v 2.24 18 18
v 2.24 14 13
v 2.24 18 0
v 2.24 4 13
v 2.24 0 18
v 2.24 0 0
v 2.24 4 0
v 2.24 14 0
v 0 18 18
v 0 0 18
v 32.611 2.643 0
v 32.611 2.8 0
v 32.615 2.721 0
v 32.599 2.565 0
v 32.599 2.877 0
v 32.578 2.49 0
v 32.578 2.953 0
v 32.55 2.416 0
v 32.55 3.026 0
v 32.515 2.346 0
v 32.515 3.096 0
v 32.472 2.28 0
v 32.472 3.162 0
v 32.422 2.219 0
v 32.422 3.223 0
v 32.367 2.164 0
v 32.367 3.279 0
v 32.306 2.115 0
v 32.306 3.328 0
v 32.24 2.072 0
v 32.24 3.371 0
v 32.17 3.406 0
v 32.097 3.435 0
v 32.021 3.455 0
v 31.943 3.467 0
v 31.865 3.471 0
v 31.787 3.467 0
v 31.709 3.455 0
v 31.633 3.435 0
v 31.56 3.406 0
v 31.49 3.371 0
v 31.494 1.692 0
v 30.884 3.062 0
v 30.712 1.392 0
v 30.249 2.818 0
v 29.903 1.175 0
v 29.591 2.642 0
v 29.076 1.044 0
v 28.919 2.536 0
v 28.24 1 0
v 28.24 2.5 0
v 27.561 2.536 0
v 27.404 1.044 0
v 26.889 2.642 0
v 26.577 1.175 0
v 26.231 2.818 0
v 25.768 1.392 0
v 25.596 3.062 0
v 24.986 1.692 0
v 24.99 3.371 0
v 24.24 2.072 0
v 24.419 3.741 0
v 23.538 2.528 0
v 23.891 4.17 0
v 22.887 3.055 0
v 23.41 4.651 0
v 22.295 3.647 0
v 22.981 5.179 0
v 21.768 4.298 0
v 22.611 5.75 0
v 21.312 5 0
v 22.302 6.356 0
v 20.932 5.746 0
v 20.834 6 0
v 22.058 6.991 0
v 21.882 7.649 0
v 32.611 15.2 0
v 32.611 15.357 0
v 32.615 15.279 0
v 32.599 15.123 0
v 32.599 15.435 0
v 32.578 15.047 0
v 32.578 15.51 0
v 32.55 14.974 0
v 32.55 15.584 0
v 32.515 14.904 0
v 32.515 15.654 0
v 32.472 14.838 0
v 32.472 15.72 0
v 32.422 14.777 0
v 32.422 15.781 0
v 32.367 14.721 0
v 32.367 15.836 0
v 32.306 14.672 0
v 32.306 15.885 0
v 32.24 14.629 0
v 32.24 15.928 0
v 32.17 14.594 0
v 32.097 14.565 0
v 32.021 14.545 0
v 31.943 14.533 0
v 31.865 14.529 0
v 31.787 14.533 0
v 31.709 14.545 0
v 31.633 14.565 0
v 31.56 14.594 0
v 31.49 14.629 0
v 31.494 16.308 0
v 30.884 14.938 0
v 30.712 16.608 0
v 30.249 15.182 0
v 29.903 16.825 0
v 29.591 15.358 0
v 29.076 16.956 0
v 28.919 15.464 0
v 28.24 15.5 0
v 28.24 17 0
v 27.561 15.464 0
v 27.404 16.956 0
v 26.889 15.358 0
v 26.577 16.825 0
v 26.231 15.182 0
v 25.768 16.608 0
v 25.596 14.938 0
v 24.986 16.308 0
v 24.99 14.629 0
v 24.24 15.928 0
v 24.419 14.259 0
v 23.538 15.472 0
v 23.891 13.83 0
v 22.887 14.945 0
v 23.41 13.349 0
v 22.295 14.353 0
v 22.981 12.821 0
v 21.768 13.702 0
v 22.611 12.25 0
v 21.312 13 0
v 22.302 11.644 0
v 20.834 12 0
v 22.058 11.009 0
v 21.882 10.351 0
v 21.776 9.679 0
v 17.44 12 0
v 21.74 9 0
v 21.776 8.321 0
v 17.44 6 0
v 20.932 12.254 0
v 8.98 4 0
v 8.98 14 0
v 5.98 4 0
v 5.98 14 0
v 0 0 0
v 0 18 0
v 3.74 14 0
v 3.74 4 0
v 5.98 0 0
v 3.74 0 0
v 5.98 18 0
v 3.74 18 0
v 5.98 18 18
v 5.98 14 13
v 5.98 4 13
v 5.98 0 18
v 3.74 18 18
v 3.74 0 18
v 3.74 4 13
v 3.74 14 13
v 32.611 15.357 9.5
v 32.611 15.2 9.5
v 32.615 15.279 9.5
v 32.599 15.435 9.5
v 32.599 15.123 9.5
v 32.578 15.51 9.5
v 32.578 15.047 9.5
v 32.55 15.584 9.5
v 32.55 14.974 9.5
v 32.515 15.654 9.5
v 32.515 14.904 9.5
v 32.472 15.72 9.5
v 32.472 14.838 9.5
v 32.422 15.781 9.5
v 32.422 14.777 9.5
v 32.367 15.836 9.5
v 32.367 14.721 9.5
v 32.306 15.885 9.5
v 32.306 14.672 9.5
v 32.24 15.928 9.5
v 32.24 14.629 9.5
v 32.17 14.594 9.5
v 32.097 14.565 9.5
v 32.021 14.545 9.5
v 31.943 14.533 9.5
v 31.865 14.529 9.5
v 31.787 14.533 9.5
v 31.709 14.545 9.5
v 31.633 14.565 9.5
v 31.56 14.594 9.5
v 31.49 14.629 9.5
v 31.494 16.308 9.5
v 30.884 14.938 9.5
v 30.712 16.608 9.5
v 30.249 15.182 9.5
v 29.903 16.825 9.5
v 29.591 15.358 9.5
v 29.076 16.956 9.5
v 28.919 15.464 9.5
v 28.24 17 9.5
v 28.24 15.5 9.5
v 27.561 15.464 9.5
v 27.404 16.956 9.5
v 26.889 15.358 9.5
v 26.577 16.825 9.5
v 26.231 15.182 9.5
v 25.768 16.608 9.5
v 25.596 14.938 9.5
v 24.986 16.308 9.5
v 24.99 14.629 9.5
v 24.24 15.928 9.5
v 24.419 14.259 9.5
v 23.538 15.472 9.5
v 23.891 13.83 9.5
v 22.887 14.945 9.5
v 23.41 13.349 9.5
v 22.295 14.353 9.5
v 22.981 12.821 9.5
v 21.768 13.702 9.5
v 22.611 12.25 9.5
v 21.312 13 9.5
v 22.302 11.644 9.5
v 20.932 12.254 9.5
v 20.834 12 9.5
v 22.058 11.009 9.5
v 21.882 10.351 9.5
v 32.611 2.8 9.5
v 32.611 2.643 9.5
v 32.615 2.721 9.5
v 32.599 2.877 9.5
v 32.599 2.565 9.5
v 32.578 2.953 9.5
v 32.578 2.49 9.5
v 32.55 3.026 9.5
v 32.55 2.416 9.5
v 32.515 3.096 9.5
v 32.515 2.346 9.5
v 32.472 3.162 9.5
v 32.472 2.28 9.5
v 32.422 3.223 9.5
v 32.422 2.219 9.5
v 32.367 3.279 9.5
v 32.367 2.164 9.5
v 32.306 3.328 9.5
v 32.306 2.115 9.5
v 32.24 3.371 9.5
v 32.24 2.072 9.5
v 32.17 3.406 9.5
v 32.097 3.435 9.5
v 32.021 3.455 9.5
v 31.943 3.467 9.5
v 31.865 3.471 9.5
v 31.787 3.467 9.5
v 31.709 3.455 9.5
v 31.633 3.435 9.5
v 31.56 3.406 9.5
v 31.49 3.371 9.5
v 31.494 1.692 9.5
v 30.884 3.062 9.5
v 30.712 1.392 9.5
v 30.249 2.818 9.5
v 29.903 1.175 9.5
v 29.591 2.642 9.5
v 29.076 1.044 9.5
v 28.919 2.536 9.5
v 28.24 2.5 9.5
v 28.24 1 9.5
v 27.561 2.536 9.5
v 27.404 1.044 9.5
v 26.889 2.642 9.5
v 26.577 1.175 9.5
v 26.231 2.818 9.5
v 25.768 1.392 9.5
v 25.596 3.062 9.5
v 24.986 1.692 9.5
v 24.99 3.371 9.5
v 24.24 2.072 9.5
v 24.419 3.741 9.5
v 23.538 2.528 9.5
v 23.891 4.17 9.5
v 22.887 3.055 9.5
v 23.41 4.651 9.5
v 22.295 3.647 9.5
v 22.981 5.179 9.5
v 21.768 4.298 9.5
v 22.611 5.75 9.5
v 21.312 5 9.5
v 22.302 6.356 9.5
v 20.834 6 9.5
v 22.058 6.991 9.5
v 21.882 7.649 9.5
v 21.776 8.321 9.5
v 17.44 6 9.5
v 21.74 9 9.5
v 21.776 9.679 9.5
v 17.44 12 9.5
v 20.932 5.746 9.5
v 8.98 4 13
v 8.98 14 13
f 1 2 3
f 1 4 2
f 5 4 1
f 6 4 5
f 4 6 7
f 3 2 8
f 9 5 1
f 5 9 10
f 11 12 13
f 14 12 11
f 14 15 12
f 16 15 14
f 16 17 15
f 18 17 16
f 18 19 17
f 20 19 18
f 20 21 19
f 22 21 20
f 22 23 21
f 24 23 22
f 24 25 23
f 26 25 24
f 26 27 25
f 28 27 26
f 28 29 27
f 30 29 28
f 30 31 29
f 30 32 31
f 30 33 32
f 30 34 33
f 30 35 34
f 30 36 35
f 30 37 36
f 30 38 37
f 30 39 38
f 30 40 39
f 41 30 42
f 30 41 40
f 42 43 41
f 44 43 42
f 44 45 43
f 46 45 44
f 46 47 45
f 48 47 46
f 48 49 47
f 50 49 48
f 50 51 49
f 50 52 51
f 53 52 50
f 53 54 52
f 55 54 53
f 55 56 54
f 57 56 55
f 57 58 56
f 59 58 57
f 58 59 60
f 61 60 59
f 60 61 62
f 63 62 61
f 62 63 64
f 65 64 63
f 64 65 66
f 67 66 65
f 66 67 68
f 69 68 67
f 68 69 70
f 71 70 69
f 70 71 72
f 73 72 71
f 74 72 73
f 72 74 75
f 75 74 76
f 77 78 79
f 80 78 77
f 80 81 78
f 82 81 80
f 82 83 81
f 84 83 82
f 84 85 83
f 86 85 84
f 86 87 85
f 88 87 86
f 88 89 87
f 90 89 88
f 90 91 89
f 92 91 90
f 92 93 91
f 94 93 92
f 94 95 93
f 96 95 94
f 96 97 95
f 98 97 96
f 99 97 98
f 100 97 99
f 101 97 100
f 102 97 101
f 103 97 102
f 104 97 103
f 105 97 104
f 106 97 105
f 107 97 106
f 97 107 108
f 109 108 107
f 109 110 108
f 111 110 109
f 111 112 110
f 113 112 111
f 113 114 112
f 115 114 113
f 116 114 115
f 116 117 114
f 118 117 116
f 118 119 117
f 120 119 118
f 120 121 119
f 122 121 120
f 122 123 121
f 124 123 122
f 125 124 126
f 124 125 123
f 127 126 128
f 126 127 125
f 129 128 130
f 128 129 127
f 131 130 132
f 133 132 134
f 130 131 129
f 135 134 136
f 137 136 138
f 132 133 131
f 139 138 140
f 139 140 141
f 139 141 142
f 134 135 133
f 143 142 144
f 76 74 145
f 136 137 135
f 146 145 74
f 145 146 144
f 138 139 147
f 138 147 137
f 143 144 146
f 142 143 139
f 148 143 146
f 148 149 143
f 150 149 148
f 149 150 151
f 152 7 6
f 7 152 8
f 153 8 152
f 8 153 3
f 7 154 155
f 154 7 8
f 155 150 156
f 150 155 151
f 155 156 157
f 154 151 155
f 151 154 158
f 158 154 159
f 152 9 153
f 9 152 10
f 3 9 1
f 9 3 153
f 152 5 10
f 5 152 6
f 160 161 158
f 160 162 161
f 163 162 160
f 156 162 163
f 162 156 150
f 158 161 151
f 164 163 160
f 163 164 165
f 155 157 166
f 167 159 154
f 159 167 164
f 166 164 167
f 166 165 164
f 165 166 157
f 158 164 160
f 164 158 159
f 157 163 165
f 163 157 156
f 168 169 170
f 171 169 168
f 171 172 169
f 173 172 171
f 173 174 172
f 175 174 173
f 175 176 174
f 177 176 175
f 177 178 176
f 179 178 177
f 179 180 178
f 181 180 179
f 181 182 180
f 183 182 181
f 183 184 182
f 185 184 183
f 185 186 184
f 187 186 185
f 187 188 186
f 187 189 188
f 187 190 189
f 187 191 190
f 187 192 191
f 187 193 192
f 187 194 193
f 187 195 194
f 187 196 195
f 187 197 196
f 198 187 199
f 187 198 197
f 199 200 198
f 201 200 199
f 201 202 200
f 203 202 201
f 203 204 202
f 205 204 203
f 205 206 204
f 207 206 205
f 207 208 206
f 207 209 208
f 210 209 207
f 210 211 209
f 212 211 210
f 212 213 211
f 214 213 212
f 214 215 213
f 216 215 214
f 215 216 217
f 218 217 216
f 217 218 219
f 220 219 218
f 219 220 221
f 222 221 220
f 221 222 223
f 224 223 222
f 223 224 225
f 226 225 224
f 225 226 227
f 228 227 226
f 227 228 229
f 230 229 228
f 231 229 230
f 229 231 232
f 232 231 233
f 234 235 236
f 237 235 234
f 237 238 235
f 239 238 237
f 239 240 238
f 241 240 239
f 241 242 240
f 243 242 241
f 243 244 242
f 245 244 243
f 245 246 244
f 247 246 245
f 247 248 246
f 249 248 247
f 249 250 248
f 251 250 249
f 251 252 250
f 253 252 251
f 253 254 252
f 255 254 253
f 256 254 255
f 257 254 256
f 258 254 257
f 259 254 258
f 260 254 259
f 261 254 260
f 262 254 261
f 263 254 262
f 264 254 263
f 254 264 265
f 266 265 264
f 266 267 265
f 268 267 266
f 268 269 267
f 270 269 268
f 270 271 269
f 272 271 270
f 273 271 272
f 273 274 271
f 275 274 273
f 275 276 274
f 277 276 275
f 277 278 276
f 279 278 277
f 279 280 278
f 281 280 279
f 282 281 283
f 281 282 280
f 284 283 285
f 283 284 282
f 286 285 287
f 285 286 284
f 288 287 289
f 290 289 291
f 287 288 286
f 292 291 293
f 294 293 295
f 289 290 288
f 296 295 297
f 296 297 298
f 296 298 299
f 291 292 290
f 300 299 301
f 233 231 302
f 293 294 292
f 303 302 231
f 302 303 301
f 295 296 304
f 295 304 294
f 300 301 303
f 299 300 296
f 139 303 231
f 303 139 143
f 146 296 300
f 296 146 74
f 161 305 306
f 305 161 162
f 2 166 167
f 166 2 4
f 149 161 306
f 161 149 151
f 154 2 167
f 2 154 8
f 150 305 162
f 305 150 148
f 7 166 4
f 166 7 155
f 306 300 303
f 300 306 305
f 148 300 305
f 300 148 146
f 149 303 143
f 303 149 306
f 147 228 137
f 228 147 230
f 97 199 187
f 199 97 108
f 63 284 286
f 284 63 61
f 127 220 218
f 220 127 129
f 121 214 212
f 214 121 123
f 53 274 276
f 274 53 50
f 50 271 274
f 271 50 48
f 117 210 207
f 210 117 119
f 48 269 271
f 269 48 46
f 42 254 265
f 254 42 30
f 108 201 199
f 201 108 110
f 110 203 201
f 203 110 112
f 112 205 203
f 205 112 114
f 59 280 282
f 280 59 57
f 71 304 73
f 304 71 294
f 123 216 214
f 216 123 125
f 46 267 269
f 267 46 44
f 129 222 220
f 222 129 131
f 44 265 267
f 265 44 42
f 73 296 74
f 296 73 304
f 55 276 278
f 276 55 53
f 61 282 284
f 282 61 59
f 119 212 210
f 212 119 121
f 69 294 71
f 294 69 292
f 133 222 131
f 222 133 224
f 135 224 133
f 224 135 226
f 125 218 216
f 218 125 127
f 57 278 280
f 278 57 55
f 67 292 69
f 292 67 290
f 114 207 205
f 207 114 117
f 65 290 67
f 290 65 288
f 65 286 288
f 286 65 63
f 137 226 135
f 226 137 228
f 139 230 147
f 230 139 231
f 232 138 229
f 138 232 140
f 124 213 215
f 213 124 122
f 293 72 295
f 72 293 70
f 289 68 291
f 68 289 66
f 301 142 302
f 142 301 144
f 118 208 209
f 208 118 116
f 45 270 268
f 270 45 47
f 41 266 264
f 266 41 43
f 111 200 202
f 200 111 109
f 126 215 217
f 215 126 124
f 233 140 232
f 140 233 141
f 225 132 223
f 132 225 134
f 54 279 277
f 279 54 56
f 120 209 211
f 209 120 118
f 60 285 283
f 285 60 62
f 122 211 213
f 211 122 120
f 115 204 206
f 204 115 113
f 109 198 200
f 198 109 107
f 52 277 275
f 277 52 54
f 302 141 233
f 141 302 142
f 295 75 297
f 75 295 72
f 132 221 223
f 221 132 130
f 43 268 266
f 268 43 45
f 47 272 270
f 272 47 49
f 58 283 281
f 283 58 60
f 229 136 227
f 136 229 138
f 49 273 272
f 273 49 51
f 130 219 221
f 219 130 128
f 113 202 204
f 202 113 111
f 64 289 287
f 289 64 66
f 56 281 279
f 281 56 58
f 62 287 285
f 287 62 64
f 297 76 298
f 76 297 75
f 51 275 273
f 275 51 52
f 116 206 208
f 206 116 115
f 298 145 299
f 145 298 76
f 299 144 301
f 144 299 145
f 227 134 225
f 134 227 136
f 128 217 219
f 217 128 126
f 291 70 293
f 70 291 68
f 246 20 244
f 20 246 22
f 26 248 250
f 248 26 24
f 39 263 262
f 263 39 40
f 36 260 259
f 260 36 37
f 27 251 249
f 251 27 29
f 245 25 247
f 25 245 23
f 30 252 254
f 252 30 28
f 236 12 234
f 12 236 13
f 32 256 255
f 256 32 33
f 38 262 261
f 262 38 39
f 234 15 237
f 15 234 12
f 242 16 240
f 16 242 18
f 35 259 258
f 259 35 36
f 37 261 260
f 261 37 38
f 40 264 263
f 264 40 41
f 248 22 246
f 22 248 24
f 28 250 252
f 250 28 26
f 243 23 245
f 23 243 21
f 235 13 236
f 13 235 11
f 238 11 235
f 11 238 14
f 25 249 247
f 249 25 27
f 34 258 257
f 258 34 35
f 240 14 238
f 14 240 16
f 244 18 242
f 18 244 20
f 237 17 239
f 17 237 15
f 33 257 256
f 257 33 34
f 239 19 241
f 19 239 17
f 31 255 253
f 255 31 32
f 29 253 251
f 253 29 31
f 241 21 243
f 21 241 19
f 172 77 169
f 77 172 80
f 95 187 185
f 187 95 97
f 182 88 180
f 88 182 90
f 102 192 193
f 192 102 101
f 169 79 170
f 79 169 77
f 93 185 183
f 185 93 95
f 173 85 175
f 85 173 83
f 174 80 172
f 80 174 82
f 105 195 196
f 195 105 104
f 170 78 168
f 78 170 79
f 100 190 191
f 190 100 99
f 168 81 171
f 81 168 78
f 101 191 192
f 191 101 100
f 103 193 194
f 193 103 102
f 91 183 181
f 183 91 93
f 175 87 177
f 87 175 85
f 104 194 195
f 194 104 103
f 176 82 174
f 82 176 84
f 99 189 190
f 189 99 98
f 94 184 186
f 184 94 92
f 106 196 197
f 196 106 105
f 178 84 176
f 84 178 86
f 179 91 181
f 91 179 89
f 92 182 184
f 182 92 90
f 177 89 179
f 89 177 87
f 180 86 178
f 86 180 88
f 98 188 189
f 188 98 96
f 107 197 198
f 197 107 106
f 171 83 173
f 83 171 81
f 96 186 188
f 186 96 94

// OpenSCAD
/* [Mounting Bracket] */

// thickness of mounting brackets
mountBracketThickness = 2.24;

// should there be a top clamp
hasTopClamp = true;

// gap between top and bottom brackets
gapDistance = 1.5;

/* [Flashlight Params] */
// how much clearance does the light need
clearance = 18;

// diameter of flashlight
flashlightDiameter = 15;

// how much smaller should the ring be than the light
clampTightness = 2;

// how deep is the clamp
clampDepth = 9.5;

// how thick is the clamp
clampThickness = 1.5;

// what angle should the clamp gap be cut at
clampGapAngle = 120; // [10:170]

/* [Hidden ] */
// the width of the mounting bracket
mountWidth = 18;

// computed values
clampRadius = (flashlightDiameter - clampTightness) / 2;
ringRadius = clampRadius + clampThickness;
totalColumnLength = gapDistance + mountBracketThickness + clearance;
ringCenter = totalColumnLength + clampRadius;

difference() {
    // solid part
    union() {
        // coldshoe mount
        cube([mountBracketThickness, mountWidth, mountWidth]);

        // clamp for coldshoe to hold fast
        if (hasTopClamp)
            translate([gapDistance + mountBracketThickness, 0, 0])
                cube([mountBracketThickness, mountWidth, mountWidth]);

        // post
        translate([0, (mountWidth - 6) / 2, 0])
            color("green") cube([ringCenter, 6, clampDepth]);
                    
        color("red") hull() {
            // post support
            translate([0, (mountWidth - 10) / 2, 0])
                cube([gapDistance + mountBracketThickness * 2 + 3, 10, 13]);

            translate([0, (mountWidth - 6) / 2, 0])
                cube([totalColumnLength - 4.3, 6, clampDepth]);
        };

        // clamp
        translate([ringCenter, mountWidth / 2, 0])
            color("blue") cylinder(h = clampDepth, r = ringRadius, $fn = 60);
    }
    
    // hole
    translate([ringCenter, mountWidth / 2, 0])
        cylinder(h = clampDepth, r = clampRadius, $fn = 60);    

    // flashlight gap
    translate([ringCenter, mountWidth / 2, 0])
        linear_extrude(height = clampDepth, convexity = 10) {
            verticalOffset = tan(clampGapAngle / 2) * ringRadius;
            polygon(points=[[0,0], [ringRadius,verticalOffset], [ringRadius,-verticalOffset]]);
        };
};

for (side = [-1, 1]) {
    translate([ringCenter, mountWidth / 2, 0])
        rotate([0, 0, clampGapAngle / 2 * side])
            translate([(ringRadius + clampRadius) / 2, 0, 0])
                color("cyan") cylinder(h = clampDepth, r = clampThickness / 2, $fn = 60);
};
